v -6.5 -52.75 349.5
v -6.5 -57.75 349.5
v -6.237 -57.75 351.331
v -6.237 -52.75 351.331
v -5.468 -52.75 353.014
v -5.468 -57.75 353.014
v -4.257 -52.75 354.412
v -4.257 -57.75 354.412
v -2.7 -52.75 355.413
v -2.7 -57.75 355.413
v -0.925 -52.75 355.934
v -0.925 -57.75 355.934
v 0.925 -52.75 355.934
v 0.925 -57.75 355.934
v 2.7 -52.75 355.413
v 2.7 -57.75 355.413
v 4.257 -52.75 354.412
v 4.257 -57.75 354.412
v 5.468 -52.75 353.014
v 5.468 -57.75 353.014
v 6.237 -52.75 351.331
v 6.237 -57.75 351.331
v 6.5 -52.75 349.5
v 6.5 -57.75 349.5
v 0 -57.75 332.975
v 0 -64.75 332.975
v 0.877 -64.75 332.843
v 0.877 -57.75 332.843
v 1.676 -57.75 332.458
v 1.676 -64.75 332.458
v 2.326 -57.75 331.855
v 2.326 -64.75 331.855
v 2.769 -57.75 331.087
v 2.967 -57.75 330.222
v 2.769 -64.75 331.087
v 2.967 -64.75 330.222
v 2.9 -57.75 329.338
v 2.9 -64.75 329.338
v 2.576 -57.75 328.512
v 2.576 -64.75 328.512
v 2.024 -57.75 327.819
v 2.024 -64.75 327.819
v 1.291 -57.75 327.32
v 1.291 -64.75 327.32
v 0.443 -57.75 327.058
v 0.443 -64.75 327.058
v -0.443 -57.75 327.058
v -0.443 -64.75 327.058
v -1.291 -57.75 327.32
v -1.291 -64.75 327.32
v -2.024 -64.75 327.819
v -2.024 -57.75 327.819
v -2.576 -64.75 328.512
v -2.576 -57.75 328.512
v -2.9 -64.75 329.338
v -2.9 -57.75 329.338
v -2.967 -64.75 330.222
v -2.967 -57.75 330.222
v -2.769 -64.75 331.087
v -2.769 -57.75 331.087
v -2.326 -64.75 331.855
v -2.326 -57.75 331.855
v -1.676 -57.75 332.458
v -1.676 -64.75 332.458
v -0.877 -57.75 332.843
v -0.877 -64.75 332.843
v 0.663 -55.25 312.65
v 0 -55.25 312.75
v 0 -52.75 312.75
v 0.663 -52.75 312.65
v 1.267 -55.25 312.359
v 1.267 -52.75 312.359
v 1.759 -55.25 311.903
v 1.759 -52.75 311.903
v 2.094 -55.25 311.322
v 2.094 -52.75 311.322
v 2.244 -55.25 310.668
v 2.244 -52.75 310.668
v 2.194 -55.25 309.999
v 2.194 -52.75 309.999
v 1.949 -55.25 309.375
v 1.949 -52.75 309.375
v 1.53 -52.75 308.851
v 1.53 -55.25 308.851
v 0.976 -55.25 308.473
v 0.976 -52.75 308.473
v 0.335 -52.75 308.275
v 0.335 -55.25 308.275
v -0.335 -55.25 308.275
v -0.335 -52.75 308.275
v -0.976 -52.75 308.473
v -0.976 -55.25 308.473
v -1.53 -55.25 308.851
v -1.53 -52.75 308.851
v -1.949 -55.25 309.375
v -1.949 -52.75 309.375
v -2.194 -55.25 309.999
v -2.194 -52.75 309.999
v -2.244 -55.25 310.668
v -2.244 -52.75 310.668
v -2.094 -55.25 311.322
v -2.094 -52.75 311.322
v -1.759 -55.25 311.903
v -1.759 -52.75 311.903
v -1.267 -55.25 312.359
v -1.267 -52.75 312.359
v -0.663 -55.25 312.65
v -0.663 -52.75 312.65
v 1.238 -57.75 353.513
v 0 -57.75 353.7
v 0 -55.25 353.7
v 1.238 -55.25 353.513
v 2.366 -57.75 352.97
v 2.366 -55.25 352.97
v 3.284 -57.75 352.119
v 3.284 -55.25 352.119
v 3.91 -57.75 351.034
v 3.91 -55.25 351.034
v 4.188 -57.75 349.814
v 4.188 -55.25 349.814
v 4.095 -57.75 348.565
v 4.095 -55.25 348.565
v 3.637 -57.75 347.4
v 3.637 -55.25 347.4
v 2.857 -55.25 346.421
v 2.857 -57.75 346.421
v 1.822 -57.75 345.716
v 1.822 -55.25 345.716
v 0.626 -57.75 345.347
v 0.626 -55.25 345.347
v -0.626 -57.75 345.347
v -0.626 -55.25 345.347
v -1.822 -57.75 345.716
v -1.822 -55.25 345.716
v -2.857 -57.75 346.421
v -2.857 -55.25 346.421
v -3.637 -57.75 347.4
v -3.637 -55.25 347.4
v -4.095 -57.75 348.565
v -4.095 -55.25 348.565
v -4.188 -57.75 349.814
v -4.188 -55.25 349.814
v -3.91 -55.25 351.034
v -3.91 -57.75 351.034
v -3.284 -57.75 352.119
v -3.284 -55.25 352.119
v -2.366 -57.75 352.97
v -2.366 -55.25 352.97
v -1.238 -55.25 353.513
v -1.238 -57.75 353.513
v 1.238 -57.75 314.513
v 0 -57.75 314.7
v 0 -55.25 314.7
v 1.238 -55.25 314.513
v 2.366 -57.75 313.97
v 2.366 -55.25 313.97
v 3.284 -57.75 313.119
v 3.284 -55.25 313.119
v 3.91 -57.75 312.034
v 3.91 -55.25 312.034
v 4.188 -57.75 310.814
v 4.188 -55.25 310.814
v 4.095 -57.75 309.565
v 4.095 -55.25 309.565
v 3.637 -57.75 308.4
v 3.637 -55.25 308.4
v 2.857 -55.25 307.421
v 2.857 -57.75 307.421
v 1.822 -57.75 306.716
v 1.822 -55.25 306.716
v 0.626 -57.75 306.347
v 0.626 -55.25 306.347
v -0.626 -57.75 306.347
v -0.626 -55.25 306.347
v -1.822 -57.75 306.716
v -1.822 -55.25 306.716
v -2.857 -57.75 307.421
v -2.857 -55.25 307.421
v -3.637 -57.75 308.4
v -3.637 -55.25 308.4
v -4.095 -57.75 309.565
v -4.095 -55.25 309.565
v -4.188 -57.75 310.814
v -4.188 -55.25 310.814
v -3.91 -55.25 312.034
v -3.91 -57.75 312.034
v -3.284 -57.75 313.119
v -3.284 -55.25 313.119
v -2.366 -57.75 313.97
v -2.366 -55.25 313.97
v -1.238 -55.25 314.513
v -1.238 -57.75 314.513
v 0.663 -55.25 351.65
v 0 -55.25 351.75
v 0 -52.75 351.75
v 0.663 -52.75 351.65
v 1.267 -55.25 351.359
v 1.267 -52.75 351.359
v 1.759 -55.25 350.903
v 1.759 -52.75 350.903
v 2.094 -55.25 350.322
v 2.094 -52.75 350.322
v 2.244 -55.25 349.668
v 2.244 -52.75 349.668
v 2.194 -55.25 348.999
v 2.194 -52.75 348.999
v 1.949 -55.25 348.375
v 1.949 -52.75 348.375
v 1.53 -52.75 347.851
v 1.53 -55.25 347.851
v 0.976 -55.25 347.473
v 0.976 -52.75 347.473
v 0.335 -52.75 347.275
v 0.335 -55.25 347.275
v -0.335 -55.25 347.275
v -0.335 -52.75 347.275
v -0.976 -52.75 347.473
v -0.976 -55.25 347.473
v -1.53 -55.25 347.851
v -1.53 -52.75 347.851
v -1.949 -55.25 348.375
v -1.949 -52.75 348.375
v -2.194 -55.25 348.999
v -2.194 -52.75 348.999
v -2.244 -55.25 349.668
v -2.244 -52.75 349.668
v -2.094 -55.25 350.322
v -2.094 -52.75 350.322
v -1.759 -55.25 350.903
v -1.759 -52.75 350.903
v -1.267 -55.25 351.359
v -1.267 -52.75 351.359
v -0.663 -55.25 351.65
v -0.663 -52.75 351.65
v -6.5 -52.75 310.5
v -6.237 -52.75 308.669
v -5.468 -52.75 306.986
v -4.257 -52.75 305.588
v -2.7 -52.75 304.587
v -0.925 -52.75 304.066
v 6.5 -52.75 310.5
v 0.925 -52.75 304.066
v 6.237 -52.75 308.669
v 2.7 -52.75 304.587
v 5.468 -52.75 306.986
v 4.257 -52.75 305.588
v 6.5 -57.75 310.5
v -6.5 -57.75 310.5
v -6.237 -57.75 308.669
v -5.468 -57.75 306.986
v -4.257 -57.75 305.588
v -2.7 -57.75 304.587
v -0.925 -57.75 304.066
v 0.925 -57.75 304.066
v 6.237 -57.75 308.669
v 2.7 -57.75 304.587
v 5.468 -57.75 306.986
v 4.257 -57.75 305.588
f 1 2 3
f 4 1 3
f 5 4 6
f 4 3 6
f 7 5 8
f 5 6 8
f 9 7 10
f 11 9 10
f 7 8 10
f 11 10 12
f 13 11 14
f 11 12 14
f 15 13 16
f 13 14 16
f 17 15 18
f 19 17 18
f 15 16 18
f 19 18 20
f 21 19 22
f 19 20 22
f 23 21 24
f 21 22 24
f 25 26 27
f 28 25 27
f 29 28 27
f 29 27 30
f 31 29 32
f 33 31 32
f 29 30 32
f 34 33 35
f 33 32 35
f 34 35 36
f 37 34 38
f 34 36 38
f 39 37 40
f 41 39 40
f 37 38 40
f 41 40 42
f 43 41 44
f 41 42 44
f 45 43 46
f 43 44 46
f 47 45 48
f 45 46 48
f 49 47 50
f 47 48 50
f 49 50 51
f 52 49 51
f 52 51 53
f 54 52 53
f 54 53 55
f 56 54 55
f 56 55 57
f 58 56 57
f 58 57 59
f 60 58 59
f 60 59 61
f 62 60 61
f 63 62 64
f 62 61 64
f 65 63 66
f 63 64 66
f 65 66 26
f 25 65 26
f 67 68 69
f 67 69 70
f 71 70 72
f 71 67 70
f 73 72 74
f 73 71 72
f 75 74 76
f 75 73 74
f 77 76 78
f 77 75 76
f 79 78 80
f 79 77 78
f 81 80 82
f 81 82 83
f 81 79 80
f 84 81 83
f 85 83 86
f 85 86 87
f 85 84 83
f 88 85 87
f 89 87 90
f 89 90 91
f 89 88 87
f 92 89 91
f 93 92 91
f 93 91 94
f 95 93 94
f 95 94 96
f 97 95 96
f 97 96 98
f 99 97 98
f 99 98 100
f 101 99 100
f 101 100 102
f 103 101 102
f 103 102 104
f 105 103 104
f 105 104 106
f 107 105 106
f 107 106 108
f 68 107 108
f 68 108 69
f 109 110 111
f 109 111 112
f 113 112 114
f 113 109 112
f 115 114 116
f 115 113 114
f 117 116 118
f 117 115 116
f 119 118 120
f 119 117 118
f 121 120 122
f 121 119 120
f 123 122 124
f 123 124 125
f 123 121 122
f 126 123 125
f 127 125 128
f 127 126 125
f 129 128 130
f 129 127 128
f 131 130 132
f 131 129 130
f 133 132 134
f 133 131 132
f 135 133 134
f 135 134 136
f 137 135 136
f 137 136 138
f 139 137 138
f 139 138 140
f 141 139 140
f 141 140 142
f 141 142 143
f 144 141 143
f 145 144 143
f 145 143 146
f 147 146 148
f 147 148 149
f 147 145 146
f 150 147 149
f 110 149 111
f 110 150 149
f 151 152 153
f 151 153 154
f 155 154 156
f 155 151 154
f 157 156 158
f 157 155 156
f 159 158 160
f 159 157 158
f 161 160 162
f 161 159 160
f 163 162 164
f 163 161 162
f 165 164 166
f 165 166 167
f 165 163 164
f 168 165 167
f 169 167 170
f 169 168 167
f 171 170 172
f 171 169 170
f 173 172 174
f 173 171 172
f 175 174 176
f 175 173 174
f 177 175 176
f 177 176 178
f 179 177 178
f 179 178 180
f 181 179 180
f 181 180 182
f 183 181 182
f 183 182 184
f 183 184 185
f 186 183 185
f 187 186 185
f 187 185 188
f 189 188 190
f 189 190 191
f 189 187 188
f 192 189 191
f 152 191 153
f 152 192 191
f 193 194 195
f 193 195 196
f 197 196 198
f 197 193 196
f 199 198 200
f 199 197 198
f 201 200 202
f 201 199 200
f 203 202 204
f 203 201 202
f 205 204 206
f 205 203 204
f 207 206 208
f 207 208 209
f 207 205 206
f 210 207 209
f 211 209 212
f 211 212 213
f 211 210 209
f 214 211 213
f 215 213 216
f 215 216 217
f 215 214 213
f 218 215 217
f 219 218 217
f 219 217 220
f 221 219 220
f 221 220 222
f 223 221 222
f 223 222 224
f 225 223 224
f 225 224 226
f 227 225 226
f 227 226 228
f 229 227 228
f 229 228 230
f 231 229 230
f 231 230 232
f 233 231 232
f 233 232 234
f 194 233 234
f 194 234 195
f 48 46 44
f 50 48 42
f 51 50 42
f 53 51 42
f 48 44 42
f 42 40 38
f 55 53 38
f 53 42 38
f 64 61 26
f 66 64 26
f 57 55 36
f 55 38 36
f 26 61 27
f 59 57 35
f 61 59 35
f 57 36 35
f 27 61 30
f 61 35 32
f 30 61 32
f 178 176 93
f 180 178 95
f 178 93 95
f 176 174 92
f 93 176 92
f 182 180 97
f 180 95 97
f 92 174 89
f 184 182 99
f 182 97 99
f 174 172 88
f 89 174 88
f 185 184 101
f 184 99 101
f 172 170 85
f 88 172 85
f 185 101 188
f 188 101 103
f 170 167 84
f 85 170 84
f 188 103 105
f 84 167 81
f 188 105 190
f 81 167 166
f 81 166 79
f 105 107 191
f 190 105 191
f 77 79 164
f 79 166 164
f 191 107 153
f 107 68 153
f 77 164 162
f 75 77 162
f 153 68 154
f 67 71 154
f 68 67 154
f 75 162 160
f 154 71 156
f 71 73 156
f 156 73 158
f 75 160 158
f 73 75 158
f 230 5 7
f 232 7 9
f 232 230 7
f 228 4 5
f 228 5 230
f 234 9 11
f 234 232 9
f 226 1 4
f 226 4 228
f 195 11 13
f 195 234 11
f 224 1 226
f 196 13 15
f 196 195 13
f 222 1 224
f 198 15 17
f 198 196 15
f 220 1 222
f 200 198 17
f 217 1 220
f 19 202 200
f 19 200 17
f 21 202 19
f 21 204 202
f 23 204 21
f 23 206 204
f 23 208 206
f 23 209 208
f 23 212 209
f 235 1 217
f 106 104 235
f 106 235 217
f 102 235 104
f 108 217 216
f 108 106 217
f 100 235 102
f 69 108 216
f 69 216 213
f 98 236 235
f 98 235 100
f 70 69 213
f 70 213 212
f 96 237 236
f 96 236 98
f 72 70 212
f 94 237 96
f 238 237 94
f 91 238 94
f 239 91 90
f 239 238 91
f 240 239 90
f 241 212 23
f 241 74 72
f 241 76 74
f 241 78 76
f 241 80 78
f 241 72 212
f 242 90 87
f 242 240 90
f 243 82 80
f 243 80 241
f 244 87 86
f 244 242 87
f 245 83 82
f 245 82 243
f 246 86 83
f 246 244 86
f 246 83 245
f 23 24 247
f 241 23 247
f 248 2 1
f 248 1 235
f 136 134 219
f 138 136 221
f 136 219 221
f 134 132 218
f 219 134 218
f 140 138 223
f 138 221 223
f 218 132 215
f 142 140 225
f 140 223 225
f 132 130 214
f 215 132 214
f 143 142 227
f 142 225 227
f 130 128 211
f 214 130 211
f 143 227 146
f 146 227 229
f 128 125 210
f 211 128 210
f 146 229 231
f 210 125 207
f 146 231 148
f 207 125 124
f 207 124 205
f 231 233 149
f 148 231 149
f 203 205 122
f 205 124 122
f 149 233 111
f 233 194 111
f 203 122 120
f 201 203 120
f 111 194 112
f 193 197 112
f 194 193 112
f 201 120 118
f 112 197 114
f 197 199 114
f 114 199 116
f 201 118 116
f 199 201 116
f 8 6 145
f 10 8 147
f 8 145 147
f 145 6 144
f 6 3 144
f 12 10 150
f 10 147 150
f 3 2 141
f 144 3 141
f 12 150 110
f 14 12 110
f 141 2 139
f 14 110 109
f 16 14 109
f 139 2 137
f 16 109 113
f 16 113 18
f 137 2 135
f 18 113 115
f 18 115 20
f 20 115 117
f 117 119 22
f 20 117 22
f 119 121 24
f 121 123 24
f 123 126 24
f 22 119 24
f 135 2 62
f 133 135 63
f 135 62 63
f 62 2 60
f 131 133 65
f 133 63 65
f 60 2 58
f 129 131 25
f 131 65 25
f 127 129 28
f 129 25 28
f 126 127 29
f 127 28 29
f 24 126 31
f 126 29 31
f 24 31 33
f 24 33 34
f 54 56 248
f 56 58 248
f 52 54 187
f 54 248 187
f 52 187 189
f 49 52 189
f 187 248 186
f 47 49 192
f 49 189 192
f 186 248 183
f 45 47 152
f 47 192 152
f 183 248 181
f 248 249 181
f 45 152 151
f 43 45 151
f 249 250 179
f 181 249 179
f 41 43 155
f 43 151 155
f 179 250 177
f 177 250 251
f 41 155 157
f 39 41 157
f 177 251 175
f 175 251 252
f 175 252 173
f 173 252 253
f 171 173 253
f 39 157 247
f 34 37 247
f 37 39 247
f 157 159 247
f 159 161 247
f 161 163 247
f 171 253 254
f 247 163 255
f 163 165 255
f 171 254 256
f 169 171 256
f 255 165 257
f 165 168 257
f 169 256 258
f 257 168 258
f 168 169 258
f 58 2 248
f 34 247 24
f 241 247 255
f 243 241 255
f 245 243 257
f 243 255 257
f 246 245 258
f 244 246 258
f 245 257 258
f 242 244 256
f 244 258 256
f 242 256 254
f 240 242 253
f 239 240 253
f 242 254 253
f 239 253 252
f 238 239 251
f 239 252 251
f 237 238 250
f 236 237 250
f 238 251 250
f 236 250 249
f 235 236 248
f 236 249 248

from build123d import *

# Parameters (mm, degrees)
BARRA_START         = -57.75
SK_BARRA_W          = 13
SK_BARRA_H          = 39
BARRA_DEPTH         = 5
EXTREMOS_START      = -57.75
SK_EXTREMOS_R       = 6.5
EXTREMOS_DEPTH      = 5
PERNO_696_START     = -64.75
SK_PERNO_696_R      = 2.975
PERNO_696_DEPTH     = 7
PASANTES_M4_START   = -57.75
SK_PASANTES_M4_R    = 2.25
PASANTES_M4_DEPTH   = 5
AVELLANADO_M4_START = -57.75
SK_AVELLANADO_M4_R  = 4.2
AVELLANADO_M4_DEPTH = 2.5


with BuildPart() as part:
    # Sk_Barra → Barra (new body)
    with BuildSketch(Plane(origin=(0, 0, 0), x_dir=(1, 0, 0), z_dir=(0, 1, 0)).offset(BARRA_START)):
        with Locations((0, -330)):
            Rectangle(SK_BARRA_W, SK_BARRA_H)
    extrude(amount=BARRA_DEPTH)

    # Sk_Extremos → Extremos (add)
    with BuildSketch(Plane(origin=(0, 0, 0), x_dir=(1, 0, 0), z_dir=(0, 1, 0)).offset(EXTREMOS_START)):
        with Locations((0, -310.5)):
            Circle(SK_EXTREMOS_R)
        with Locations((0, -349.5)):
            Circle(SK_EXTREMOS_R)
    extrude(amount=EXTREMOS_DEPTH)

    # Sk_Perno_696 → Perno_696 (add)
    with BuildSketch(Plane(origin=(0, 0, 0), x_dir=(1, 0, 0), z_dir=(0, 1, 0)).offset(PERNO_696_START)):
        with Locations(Location((0, -330, 0), (0, 0, 270))):
            Circle(SK_PERNO_696_R)
    extrude(amount=PERNO_696_DEPTH)

    # Sk_Pasantes_M4 → Pasantes_M4 (cut)
    with BuildSketch(Plane(origin=(0, 0, 0), x_dir=(1, 0, 0), z_dir=(0, 1, 0)).offset(PASANTES_M4_START)):
        with Locations(Location((0, -310.5, 0), (0, 0, 270))):
            Circle(SK_PASANTES_M4_R)
        with Locations(Location((0, -349.5, 0), (0, 0, 270))):
            Circle(SK_PASANTES_M4_R)
    extrude(amount=PASANTES_M4_DEPTH, mode=Mode.SUBTRACT)

    # Sk_Avellanado_M4 → Avellanado_M4 (cut)
    with BuildSketch(Plane(origin=(0, 0, 0), x_dir=(1, 0, 0), z_dir=(0, 1, 0)).offset(AVELLANADO_M4_START)):
        with Locations(Location((0, -310.5, 0), (0, 0, 270))):
            Circle(SK_AVELLANADO_M4_R)
        with Locations(Location((0, -349.5, 0), (0, 0, 270))):
            Circle(SK_AVELLANADO_M4_R)
    extrude(amount=AVELLANADO_M4_DEPTH, mode=Mode.SUBTRACT)


solid = part.part
